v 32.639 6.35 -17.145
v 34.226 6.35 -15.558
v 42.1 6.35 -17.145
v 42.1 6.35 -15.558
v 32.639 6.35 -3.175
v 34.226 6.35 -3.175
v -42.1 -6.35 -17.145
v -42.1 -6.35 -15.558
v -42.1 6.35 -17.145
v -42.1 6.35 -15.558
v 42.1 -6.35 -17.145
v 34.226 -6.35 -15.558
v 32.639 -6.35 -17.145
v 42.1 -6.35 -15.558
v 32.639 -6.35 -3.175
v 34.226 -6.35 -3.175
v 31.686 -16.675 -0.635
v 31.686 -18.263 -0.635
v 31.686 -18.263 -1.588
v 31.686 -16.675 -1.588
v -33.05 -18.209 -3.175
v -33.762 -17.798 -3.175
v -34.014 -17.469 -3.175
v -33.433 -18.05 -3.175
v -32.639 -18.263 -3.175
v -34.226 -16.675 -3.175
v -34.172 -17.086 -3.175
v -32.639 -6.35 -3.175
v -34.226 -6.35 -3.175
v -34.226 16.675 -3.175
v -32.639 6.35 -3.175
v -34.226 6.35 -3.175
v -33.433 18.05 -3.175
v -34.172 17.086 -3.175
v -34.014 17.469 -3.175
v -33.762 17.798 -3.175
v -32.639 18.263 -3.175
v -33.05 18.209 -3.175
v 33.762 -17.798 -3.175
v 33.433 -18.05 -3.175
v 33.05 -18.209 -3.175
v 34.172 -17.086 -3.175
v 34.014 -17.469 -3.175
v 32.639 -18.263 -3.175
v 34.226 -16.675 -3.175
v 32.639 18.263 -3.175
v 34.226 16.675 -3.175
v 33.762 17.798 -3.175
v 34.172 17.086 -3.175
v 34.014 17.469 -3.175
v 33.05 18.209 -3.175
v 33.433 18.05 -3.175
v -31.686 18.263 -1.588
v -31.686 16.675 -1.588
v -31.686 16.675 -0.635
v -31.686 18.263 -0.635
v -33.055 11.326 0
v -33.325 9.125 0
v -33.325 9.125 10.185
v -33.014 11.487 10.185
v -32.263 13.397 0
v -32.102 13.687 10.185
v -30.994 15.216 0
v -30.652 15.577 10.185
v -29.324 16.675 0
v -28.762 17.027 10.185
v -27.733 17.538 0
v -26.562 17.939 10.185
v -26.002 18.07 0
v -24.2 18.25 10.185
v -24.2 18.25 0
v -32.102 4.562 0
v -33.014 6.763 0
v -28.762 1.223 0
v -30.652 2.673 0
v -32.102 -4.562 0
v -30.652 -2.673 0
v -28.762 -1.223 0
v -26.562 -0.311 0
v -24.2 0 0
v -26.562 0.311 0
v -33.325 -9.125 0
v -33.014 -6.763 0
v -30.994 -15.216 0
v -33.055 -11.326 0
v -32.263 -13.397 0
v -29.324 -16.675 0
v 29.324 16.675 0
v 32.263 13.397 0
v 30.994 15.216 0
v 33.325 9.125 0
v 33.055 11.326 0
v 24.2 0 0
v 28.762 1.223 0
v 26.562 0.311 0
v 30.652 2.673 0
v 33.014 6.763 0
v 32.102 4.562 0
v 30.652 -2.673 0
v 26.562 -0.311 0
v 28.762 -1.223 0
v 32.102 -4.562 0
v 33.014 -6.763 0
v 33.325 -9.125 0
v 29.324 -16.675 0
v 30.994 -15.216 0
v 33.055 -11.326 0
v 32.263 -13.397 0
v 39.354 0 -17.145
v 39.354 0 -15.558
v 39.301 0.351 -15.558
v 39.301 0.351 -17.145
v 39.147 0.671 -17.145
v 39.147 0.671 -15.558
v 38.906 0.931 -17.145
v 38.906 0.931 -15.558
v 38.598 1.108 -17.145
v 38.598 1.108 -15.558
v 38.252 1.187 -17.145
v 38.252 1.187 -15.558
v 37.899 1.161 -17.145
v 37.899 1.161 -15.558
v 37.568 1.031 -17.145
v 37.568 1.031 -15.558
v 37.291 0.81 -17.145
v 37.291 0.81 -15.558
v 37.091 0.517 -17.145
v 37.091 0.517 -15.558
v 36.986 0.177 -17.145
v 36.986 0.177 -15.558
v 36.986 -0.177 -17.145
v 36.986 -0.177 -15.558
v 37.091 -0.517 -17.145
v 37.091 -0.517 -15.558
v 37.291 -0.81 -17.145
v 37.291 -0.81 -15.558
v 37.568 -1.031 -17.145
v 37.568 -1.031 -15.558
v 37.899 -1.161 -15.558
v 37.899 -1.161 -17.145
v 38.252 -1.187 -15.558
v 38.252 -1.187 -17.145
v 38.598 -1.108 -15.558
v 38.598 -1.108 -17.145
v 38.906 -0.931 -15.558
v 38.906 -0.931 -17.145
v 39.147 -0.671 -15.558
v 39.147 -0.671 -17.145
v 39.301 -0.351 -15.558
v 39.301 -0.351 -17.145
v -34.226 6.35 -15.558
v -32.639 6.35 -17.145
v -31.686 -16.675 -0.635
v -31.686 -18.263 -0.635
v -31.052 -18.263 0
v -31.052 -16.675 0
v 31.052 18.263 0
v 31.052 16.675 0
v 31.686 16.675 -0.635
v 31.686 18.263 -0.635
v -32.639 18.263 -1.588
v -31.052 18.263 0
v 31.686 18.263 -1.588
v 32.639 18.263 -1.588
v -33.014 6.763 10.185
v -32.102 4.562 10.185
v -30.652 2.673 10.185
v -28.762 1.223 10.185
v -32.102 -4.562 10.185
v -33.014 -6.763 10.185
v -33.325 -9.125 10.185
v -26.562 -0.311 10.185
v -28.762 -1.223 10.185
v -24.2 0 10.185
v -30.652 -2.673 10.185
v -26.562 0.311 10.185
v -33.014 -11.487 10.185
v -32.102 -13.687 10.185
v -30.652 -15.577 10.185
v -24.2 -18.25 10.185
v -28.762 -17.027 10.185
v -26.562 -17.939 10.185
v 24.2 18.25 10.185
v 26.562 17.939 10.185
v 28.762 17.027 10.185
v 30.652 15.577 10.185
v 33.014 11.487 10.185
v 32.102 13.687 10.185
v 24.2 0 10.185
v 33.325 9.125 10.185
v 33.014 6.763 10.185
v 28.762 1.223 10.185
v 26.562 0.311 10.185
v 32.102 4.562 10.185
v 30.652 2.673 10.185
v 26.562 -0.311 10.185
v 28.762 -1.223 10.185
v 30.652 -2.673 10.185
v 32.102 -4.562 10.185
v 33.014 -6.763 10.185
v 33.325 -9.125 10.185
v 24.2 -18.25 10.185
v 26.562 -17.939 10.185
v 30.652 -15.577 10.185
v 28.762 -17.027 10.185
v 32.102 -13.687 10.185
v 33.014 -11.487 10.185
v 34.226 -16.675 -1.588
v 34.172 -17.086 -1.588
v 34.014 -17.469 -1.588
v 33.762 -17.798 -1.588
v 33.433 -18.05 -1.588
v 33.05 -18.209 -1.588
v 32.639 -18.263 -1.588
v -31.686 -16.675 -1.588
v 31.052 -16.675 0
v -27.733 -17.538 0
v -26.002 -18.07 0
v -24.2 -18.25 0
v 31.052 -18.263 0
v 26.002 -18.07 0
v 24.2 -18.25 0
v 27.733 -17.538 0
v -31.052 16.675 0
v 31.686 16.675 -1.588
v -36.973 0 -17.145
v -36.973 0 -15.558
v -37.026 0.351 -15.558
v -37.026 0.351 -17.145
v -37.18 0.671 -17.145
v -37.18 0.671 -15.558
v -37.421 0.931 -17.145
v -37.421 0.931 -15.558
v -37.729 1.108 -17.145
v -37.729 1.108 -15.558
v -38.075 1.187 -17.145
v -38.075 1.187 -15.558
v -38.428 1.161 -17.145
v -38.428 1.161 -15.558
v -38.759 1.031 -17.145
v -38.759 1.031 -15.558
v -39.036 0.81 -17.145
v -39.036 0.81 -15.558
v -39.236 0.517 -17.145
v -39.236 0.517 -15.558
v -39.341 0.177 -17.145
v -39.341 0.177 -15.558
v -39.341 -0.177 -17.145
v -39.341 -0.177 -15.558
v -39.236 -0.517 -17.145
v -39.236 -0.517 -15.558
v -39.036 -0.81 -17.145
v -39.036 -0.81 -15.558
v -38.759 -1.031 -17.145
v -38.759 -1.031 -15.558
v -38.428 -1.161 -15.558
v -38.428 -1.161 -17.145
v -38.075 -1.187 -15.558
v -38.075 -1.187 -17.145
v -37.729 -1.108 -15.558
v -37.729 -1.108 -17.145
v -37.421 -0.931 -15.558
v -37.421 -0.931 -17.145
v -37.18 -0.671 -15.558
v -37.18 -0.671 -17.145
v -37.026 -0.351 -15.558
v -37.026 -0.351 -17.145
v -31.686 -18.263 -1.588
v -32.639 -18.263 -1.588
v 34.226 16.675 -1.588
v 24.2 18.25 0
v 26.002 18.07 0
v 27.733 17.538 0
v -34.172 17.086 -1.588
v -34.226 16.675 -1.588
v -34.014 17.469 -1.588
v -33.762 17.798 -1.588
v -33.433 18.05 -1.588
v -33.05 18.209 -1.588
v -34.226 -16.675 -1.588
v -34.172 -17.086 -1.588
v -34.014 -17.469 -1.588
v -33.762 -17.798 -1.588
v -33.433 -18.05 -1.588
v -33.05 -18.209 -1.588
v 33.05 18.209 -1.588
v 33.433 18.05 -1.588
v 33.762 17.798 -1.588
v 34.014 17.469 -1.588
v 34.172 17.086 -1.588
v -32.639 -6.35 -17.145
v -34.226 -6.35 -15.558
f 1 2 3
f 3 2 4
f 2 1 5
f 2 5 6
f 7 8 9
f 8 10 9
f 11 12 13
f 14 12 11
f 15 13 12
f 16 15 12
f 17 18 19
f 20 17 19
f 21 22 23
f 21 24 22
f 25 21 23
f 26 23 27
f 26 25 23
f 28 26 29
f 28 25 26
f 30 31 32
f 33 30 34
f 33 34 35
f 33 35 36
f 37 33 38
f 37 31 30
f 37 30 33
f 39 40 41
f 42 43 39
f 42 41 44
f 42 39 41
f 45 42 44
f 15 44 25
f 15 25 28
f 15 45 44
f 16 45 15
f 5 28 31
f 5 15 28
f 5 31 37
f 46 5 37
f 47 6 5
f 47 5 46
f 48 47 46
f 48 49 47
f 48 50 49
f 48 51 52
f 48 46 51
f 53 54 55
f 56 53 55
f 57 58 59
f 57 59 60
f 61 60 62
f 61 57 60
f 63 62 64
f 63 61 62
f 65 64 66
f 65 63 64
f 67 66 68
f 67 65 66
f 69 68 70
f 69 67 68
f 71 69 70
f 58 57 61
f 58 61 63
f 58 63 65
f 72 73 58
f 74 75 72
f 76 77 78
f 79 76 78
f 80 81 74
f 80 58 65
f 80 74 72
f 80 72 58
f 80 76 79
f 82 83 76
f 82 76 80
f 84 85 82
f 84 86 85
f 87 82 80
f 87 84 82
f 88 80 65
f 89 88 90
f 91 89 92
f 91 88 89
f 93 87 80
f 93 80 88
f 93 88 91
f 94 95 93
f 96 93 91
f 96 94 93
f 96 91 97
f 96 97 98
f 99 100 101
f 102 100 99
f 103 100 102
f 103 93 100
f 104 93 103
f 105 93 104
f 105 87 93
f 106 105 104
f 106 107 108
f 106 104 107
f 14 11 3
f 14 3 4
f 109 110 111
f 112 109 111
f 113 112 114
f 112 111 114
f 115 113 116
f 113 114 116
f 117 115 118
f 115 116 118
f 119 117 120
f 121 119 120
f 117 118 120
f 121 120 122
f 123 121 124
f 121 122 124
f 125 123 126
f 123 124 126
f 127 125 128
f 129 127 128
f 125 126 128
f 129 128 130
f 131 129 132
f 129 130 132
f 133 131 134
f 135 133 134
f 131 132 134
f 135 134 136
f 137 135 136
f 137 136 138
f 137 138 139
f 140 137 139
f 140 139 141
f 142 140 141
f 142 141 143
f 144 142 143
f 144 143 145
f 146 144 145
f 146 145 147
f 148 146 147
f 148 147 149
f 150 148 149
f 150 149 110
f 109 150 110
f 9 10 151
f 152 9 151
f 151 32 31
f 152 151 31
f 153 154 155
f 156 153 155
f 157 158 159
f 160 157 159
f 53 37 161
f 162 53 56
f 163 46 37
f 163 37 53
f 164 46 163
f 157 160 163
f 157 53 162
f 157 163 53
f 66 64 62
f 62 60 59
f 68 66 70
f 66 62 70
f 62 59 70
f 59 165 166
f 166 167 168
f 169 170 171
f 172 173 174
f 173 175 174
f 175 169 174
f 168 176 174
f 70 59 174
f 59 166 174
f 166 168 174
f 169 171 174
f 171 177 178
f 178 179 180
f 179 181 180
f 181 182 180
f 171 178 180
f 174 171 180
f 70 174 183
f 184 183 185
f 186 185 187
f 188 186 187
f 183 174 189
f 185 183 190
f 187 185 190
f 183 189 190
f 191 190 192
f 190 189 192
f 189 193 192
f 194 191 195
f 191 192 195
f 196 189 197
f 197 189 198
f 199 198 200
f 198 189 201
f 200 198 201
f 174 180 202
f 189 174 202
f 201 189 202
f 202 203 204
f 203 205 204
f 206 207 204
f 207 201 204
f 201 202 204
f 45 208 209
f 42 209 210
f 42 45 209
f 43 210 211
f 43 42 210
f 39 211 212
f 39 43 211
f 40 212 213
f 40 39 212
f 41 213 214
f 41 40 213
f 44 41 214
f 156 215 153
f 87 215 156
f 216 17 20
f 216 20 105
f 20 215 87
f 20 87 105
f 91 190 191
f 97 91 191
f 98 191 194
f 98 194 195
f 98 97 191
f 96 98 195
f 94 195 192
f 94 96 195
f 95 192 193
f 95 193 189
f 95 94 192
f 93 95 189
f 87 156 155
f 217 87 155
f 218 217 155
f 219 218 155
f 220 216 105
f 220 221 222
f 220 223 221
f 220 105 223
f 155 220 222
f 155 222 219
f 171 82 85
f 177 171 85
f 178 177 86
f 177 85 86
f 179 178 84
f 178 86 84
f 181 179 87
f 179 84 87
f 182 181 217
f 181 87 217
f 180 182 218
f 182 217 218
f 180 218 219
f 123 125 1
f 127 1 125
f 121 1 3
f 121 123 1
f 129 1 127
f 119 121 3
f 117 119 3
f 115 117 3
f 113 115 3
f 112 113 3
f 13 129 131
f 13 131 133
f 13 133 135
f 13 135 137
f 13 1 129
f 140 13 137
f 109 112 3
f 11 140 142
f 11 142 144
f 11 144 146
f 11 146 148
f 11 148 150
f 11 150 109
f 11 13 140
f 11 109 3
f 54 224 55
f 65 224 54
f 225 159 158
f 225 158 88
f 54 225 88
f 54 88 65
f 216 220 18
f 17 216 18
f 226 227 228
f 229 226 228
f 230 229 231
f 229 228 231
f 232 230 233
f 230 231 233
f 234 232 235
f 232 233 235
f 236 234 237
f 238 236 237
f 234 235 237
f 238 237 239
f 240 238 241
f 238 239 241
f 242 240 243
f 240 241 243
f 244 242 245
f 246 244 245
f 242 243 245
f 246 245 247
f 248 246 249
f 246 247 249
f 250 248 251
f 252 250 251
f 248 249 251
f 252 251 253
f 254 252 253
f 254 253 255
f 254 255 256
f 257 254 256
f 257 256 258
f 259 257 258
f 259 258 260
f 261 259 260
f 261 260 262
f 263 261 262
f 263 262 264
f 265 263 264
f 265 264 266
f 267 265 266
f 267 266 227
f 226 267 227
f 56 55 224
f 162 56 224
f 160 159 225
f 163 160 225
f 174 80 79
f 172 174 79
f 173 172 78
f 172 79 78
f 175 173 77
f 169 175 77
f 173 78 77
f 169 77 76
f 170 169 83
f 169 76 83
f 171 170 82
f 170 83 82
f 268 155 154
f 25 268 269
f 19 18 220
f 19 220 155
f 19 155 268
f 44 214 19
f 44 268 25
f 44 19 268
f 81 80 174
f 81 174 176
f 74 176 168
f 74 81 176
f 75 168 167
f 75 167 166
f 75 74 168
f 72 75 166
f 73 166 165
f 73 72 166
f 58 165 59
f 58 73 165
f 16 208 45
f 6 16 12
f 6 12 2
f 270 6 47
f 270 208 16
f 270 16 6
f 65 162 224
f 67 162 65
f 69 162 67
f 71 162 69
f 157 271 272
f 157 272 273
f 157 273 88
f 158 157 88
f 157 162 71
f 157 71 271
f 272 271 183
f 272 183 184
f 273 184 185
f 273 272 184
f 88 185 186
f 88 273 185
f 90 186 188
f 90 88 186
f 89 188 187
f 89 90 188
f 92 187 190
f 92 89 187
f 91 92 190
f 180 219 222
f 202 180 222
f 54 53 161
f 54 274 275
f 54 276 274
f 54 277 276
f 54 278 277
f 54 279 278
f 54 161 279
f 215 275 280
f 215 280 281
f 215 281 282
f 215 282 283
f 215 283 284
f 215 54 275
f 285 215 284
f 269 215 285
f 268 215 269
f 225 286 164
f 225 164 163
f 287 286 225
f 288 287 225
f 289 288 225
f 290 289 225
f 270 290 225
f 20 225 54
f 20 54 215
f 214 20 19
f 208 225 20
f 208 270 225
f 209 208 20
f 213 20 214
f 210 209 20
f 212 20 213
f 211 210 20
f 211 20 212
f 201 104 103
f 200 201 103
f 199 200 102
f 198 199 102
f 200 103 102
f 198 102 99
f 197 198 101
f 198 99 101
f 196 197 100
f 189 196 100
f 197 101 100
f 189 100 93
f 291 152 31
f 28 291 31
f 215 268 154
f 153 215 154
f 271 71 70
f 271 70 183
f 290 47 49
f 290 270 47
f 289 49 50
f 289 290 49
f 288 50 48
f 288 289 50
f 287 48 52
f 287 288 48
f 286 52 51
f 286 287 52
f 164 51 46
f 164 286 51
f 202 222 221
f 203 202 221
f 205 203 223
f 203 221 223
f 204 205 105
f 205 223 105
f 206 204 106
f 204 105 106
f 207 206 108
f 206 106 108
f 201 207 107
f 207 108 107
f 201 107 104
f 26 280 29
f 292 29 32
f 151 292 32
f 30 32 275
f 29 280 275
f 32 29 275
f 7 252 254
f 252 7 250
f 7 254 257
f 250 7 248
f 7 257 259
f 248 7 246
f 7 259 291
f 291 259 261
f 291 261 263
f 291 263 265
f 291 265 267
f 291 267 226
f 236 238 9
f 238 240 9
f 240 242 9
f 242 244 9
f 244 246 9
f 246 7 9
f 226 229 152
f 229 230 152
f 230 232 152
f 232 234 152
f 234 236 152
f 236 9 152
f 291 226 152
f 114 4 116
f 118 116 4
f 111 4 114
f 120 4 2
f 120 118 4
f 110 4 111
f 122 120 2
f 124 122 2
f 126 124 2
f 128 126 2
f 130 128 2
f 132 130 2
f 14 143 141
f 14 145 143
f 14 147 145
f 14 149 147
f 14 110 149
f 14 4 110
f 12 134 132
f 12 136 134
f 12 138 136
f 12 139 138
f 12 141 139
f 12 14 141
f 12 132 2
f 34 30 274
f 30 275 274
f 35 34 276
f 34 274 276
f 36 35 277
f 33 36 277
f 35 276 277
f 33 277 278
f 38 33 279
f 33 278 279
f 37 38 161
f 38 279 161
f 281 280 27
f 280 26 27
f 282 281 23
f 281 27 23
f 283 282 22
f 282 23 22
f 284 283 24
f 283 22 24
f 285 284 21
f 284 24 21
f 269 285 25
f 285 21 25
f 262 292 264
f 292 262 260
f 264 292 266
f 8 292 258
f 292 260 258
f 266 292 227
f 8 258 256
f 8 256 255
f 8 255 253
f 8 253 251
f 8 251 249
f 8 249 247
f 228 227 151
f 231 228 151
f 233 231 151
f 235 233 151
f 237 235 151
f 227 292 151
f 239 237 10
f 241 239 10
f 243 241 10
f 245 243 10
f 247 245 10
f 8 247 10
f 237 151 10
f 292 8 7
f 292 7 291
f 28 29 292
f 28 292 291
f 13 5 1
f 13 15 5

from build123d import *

# Parameters (mm, degrees)
F1_DEPTH  = 10.1854
F4_DEPTH  = 34.2265
F6_DEPTH  = 36.5262
F7_R      = 1.5875
F9_DEPTH  = 6.35
F10_R     = 1.190625
F11_DEPTH = 1.5885


with BuildPart() as f1:
    # F0 (on Top) → F1 (new body)
    with BuildSketch(Plane.XY):
        with BuildLine():
            Line((33.3248, -9.12495), (-33.3248, -9.12495))
            ThreePointArc((-33.3248, -9.12495), (-30.652164023, -15.577264023), (-24.19985, -18.2499))
            Line((-24.19985, -18.2499), (24.19985, -18.2499))
            ThreePointArc((24.19985, -18.2499), (30.652164023, -15.577264023), (33.3248, -9.12495))
        make_face()
        with BuildLine():
            Line((24.19985, 0), (0, 0))
            Line((0, 0), (-24.19985, 0))
            ThreePointArc((-24.19985, 0), (-30.652164023, -2.672635977), (-33.3248, -9.12495))
            Line((-33.3248, -9.12495), (33.3248, -9.12495))
            ThreePointArc((33.3248, -9.12495), (30.652164023, -2.672635977), (24.19985, 0))
        make_face()
    extrude(amount=F1_DEPTH)

    # F2: F1 across plane


with BuildPart() as f1_1:
    add(f1.part)
    add(f1.part.mirror(Plane.XZ))

    # F3 (on Right) → F4 (join, symmetric)
    with BuildSketch(Plane.YZ):
        Polygon((-16.6751, 0), (-18.2626, 0), (-18.2626, -3.175), (0, -3.175), (0, -1.5875), (-16.6751, -1.5875), align=None)
        Polygon((0, -1.5875), (0, -3.175), (18.2626, -3.175), (18.2626, 0), (16.6751, 0), (16.6751, -1.5875), align=None)
    extrude(amount=F4_DEPTH, both=True)

    # F5 (on face) → F6 (cut, through all)
    with BuildSketch(Plane.XZ.offset(18.2626)):
        Polygon((-34.2265, 0), (-34.2265, -1.5875), (-31.6865, -1.5875), (-31.6865, -0.635), (-31.0515, 0), align=None)
        Polygon((34.2265, 0), (31.0515, 0), (31.6865, -0.635), (31.6865, -1.5875), (34.2265, -1.5875), align=None)
    extrude(amount=-F6_DEPTH, mode=Mode.SUBTRACT)

    # F7
    f7_edges = [f1_1.edges().sort_by_distance(p)[0] for p in [
        (-34.2265, -18.2626, -2.38125),
        (-34.2265, 18.2626, -2.38125),
        (34.2265, -18.2626, -2.38125),
        (34.2265, 18.2626, -2.38125),
    ]]
    fillet(f7_edges, radius=F7_R)

    # F8 (on Front) → F9 (join, symmetric)
    with BuildSketch(Plane.XZ):
        Polygon((-32.639, -3.175), (-34.2265, -3.175), (-34.2265, -15.5575), (-42.1005, -15.5575), (-42.1005, -17.145), (-32.639, -17.145), align=None)
        Polygon((32.639, -3.175), (32.639, -17.145), (42.1005, -17.145), (42.1005, -15.5575), (34.2265, -15.5575), (34.2265, -3.175), align=None)
    extrude(amount=F9_DEPTH, both=True)

    # F10 (on face) → F11 (cut, through all)
    with BuildSketch(Plane.XY.offset(-15.5575)):
        with BuildLine():
            ThreePointArc((-39.354125, 0), (-38.1635, -1.190625), (-36.972875, 0))
            Line((-36.972875, 0), (-38.1635, 0))
            Line((-38.1635, 0), (-39.354125, 0))
        make_face()
        with BuildLine():
            Line((-38.1635, 0), (-36.972875, 0))
            ThreePointArc((-36.972875, 0), (-38.1635, 1.190625), (-39.354125, 0))
            Line((-39.354125, 0), (-38.1635, 0))
        make_face()
        with Locations((38.1635, 0)):
            Circle(F10_R)
    extrude(amount=-F11_DEPTH, mode=Mode.SUBTRACT)


solid = f1_1.part
